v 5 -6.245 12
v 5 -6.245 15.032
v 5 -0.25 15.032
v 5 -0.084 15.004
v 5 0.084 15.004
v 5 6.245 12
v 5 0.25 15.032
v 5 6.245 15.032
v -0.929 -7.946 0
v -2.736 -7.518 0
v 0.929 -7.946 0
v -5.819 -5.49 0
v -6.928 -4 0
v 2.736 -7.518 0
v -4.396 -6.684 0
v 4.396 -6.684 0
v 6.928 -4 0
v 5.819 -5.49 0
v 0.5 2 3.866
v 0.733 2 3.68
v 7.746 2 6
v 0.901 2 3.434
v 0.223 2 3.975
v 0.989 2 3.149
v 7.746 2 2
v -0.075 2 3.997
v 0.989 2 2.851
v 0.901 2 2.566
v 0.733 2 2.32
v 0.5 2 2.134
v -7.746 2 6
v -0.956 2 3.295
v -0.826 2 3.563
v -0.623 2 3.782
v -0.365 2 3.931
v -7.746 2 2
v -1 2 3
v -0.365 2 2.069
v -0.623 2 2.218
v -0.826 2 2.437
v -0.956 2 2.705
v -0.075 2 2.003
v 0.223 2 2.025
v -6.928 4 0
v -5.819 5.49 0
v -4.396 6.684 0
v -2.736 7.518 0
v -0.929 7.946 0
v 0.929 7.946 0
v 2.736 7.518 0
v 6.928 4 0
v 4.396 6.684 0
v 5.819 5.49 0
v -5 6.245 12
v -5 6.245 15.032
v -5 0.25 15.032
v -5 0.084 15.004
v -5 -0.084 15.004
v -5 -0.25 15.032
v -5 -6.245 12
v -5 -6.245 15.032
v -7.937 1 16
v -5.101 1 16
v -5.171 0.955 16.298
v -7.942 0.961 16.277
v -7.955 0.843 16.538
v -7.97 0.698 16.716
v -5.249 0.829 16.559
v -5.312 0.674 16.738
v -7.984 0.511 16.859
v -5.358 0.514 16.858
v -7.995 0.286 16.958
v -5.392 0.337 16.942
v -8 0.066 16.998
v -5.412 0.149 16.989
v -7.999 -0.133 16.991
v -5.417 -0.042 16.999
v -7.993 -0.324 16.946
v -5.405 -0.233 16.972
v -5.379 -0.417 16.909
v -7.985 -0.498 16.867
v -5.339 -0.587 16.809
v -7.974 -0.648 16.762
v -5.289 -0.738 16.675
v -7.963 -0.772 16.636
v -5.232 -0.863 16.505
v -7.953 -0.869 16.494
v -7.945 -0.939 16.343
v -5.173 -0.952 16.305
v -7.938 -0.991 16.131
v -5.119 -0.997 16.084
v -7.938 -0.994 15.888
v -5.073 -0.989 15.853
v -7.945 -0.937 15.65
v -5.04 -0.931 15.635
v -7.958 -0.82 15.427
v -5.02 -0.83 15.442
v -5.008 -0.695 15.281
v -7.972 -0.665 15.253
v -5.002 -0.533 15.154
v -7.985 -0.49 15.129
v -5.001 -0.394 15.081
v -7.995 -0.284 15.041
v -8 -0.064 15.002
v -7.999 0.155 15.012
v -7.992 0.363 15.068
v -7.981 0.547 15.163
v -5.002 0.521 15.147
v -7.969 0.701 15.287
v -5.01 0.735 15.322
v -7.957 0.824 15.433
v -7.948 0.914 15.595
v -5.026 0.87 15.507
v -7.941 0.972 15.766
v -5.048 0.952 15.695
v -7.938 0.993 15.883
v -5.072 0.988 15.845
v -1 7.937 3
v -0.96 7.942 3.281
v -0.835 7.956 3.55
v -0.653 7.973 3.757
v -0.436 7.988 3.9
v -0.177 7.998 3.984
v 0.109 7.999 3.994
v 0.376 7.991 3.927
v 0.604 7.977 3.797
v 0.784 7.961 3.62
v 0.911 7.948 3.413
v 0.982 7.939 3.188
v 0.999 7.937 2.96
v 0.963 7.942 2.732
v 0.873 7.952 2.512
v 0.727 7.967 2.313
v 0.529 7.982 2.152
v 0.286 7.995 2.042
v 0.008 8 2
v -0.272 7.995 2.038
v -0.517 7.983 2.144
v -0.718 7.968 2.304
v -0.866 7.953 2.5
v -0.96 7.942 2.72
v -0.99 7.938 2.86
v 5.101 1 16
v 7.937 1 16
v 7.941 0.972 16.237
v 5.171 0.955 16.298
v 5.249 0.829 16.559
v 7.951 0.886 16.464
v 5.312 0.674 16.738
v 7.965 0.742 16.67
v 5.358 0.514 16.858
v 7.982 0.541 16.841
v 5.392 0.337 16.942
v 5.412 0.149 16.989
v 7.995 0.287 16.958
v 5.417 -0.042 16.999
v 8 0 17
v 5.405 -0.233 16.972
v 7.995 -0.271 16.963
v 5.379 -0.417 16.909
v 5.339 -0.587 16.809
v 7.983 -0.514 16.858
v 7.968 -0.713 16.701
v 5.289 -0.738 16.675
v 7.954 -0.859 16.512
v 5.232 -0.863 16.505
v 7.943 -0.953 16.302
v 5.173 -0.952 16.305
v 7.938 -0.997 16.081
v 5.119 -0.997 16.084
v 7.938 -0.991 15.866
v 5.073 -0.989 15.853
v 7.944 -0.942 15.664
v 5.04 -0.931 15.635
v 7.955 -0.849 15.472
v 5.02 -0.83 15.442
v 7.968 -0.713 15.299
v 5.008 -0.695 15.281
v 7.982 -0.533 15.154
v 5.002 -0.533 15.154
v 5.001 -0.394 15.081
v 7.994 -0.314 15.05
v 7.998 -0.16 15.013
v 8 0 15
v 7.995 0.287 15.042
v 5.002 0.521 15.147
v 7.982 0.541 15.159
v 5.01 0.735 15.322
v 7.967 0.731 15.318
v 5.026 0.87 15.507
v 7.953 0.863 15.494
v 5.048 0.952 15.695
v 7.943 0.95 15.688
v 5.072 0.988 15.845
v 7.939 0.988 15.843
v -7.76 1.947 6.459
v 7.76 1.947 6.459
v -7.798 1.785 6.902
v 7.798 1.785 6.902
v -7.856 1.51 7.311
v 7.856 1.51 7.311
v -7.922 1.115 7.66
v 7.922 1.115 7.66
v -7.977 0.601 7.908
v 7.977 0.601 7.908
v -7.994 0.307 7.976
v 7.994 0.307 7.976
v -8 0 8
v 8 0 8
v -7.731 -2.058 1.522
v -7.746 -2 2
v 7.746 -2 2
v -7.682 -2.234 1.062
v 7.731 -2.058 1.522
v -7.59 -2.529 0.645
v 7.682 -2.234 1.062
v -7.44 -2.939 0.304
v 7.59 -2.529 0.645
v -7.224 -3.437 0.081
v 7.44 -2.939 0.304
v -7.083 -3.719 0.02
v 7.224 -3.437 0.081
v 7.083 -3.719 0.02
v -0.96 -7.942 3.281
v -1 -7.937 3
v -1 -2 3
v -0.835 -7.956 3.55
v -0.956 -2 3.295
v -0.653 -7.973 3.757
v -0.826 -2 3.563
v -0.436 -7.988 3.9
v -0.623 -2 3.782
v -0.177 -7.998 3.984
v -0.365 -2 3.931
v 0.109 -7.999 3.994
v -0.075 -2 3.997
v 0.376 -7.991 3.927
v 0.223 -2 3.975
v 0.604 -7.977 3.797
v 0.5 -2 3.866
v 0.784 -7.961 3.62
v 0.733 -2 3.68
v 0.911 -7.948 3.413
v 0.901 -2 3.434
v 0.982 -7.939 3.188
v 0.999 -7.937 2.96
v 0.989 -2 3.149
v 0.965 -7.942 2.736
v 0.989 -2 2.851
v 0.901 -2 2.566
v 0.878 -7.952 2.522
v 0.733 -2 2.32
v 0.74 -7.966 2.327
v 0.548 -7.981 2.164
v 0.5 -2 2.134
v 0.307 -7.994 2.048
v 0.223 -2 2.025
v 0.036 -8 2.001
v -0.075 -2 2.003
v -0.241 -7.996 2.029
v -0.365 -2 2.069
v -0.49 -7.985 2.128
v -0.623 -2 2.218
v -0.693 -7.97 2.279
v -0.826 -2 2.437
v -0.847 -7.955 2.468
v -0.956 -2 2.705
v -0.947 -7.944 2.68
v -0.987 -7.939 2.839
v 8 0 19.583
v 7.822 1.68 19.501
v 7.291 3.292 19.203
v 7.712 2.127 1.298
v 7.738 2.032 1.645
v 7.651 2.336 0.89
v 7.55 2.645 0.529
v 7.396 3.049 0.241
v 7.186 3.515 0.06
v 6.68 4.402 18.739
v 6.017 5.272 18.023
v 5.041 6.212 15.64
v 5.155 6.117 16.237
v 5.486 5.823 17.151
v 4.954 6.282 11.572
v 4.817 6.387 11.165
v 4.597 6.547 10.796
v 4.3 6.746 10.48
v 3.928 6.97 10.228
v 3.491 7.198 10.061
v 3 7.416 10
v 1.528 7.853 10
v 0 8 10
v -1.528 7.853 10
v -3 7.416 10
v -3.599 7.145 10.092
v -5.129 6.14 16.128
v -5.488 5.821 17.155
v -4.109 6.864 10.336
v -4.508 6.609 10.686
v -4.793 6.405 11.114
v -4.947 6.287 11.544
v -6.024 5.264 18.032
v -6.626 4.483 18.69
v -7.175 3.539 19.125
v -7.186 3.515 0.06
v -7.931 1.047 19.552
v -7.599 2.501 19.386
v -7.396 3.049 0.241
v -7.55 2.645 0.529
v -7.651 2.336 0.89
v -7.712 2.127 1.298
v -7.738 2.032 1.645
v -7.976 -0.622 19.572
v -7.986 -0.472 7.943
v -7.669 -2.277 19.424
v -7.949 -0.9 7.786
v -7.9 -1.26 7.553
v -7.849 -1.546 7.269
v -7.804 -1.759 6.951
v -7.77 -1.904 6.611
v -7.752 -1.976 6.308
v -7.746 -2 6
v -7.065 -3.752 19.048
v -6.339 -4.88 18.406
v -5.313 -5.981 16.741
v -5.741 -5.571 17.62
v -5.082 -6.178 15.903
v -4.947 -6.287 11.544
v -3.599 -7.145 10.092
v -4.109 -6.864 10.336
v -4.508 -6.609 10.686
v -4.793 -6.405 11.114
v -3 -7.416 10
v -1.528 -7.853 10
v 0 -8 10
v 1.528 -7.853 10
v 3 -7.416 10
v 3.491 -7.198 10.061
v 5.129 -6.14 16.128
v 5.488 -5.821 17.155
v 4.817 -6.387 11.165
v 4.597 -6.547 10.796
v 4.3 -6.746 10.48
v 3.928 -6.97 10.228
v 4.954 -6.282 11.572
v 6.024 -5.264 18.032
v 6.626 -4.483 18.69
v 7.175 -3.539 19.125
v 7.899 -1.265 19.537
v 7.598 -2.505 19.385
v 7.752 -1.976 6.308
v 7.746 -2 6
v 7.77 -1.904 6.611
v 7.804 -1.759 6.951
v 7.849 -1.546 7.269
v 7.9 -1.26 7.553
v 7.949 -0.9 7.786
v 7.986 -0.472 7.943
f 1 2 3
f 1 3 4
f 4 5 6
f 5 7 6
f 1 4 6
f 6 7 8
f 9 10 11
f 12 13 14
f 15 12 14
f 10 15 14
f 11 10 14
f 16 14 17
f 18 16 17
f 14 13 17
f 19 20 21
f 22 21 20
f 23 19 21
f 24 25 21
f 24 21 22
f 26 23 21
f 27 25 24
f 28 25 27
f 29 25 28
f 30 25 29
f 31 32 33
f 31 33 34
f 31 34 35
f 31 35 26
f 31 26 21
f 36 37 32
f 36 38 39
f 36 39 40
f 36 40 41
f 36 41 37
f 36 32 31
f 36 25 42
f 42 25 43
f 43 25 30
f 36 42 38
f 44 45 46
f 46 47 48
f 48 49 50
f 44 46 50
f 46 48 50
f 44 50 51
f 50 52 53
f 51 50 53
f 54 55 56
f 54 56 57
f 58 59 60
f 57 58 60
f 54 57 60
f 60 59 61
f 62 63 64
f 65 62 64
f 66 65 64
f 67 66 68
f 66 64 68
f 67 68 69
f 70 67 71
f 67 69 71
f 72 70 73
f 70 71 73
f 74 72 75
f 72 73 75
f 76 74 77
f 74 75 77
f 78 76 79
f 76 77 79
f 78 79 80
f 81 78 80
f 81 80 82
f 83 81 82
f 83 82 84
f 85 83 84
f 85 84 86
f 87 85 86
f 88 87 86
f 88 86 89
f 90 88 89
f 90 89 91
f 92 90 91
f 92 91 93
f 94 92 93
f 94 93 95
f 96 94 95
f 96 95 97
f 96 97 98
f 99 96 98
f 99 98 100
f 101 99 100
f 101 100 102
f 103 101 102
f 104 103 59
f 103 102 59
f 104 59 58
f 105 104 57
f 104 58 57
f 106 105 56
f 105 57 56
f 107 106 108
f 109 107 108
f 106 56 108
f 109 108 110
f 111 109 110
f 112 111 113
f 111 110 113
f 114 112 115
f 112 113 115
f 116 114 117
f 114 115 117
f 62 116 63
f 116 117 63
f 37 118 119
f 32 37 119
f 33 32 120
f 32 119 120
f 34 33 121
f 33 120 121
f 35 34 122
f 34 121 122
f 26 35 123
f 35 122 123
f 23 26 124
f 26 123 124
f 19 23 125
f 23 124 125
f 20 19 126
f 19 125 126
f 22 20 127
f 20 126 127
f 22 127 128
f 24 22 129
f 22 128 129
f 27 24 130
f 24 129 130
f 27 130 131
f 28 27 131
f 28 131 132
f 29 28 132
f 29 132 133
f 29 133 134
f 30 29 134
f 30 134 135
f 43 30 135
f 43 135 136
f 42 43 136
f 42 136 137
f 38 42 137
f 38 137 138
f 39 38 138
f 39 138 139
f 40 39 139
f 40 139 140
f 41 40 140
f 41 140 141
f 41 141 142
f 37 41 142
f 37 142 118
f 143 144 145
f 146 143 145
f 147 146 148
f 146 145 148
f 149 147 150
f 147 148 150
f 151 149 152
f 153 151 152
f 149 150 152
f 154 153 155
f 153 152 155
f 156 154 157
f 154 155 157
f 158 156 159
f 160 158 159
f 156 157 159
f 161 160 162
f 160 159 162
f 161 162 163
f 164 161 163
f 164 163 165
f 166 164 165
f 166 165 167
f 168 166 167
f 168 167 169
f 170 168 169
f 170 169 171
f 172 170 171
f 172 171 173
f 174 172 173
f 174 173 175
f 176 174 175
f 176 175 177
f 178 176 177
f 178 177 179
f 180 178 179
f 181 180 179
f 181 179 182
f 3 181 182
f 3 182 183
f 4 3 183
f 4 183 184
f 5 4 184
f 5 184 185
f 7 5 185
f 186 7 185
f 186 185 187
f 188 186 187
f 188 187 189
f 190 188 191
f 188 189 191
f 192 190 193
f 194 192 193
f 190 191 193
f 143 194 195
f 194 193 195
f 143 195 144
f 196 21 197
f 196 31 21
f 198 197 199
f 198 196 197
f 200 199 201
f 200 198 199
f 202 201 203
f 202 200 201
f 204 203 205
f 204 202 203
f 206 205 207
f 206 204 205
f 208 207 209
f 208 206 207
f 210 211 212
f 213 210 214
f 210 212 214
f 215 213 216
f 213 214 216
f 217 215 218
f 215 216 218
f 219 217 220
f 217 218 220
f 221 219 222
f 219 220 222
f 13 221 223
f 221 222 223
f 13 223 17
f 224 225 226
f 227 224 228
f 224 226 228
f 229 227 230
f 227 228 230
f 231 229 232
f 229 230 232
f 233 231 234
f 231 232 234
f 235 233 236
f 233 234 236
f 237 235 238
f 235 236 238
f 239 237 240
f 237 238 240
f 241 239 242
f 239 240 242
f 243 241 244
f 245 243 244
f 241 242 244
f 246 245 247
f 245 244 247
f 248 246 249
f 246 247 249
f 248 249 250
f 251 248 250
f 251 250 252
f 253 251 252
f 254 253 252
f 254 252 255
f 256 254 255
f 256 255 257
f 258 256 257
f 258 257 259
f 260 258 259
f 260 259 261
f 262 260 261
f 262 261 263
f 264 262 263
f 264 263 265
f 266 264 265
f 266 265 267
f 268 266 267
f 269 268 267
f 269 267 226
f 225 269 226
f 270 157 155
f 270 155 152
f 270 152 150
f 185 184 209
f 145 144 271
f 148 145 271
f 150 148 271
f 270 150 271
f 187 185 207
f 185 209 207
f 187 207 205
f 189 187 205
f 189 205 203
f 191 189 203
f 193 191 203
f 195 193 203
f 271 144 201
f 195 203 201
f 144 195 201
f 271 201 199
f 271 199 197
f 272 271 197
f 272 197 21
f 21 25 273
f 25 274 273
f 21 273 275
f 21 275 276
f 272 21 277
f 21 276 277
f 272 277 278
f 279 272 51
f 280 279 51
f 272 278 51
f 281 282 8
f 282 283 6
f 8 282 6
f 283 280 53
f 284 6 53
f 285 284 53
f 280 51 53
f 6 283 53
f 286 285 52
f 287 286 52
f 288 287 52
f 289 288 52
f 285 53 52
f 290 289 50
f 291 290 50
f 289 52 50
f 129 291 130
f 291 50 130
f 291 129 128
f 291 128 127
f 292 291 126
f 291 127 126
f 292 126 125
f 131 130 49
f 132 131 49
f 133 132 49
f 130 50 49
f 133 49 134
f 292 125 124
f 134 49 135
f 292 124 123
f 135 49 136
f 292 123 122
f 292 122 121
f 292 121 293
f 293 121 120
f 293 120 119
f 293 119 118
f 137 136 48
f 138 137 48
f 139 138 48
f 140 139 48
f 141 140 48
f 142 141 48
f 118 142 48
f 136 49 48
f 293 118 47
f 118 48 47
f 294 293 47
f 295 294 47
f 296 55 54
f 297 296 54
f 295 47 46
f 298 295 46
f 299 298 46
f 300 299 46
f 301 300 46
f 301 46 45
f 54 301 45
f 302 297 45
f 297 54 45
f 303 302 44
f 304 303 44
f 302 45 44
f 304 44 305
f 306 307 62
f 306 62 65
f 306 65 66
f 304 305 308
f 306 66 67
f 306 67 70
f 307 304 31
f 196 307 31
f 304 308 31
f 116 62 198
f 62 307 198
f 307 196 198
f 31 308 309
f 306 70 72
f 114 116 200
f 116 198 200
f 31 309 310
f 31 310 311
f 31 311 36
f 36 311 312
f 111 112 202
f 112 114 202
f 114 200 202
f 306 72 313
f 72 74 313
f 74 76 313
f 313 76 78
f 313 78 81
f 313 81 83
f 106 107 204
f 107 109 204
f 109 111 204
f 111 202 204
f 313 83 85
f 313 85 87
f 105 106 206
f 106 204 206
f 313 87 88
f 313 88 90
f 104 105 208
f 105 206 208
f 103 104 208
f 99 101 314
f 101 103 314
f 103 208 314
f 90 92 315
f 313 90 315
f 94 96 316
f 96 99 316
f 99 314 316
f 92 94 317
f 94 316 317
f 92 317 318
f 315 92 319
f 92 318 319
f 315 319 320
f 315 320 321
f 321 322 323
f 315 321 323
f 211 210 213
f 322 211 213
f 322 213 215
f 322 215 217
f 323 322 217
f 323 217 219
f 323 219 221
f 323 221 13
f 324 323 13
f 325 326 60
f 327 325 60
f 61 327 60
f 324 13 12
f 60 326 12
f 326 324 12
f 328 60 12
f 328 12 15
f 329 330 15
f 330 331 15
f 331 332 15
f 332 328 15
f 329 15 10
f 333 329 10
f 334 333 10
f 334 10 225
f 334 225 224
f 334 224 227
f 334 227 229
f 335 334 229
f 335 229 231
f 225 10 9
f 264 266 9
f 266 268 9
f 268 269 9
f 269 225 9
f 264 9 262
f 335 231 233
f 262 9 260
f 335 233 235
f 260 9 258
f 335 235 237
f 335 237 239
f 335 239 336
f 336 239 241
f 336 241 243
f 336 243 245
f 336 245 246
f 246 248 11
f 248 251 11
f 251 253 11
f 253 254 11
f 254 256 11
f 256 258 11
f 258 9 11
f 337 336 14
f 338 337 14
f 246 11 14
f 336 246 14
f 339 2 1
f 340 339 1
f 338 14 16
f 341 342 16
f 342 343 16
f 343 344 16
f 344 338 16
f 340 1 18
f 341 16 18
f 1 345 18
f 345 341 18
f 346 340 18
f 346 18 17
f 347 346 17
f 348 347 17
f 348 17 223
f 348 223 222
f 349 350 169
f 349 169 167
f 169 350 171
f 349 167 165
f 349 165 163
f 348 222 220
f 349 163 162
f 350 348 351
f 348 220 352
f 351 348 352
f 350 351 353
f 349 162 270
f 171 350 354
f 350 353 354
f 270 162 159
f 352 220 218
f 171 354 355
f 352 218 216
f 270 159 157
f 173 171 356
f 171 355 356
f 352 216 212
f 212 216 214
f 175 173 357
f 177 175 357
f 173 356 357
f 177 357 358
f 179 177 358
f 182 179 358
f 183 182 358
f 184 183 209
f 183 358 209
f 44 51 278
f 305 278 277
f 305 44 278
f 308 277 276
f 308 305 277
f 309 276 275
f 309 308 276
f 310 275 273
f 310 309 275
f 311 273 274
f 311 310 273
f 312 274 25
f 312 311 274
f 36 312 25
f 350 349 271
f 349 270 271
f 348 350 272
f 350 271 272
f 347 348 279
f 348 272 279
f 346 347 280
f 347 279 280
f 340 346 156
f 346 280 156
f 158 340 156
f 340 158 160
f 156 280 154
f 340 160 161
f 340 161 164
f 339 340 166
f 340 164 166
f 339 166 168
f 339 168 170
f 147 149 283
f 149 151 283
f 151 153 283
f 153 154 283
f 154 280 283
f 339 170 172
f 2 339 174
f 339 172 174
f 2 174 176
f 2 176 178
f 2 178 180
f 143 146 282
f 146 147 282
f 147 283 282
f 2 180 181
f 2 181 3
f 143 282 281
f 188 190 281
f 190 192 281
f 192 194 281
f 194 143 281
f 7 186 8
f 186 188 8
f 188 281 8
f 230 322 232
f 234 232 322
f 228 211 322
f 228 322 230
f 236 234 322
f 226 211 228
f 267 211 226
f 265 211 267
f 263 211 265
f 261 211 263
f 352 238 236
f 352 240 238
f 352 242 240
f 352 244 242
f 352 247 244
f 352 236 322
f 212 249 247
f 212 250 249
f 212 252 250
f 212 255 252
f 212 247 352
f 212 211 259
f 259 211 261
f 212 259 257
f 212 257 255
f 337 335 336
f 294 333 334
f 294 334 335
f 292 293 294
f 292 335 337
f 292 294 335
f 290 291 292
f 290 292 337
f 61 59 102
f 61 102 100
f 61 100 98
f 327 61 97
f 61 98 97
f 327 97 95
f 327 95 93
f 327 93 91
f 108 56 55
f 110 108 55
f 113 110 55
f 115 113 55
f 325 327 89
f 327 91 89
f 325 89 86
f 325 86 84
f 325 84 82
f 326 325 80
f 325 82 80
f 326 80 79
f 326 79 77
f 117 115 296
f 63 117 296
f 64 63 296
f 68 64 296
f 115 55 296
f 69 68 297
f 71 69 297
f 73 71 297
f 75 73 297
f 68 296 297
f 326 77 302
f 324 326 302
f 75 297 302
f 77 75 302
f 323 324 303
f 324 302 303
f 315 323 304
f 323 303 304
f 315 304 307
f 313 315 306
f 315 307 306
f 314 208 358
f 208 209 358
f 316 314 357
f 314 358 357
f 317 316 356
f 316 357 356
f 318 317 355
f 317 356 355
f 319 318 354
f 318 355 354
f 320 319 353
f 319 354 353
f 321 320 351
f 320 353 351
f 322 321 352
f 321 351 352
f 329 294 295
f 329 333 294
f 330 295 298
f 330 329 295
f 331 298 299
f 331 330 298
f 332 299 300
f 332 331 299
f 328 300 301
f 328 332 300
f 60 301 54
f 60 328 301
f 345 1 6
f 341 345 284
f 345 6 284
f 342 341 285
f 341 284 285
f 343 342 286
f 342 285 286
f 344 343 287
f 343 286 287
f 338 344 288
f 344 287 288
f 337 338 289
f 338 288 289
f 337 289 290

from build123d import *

# Parameters (mm, degrees)
F0_R         = 8
F1_DEPTH     = 20
F3_DEPTH     = 10
F5_DEPTH     = 8
F7_D         = 2
F7_DEPTH     = 3.001
F9_D         = 2
F10_T1_DEPTH = 37.4894960018
F12_D        = 2
F12_DEPTH    = 6.0010001
F14_D        = 2
F15_R        = 2
F16_R        = 1.9999


# Not quite as in the source:
# - a fillet or chamfer that OpenCascade refuses, or shapes differently, is made with other operations: its cross-section is extruded or revolved along the edge and cut away or added
# - a fillet or chamfer is up to 0.001 mm smaller than in the source, because OpenCascade refuses the exact size


with BuildPart() as f1:
    # F0 (on Top) → F1 (new body)
    with BuildSketch(Plane.XY):
        Circle(F0_R)
    extrude(amount=F1_DEPTH)

    # F2 (on face) → F3 (cut)
    with BuildSketch(Plane.XY.offset(20)):
        with BuildLine():
            ThreePointArc((5, 6.2449979984), (0, 8), (-5, 6.2449979984))
            Line((-5, 6.2449979984), (-5, -6.2449979984))
            ThreePointArc((-5, -6.2449979984), (0, -8), (5, -6.2449979984))
            Line((5, -6.2449979984), (5, 6.2449979984))
        make_face()
    extrude(amount=-F3_DEPTH, mode=Mode.SUBTRACT)

    # F4 (on face) → F5 (cut)
    with BuildSketch(Plane.XY):
        with BuildLine():
            ThreePointArc((8, 0), (7.9362375701, 1.0080343399), (7.7459666924, 2))
            Line((7.7459666924, 2), (-7.7459666924, 2))
            ThreePointArc((-7.7459666924, 2), (-7.9362375701, 1.0080343399), (-8, 0))
            ThreePointArc((-8, 0), (-7.9362375701, -1.0080343399), (-7.7459666924, -2))
            Line((-7.7459666924, -2), (7.7459666924, -2))
            ThreePointArc((7.7459666924, -2), (7.9362375701, -1.0080343399), (8, 0))
        make_face()
    extrude(amount=F5_DEPTH, mode=Mode.SUBTRACT)

    # F7 (through all, one way)
    with BuildSketch(Plane.YZ.offset(-5)):
        with Locations((0, 16)):
            Circle(F7_D / 2)
    extrude(amount=-F7_DEPTH, mode=Mode.SUBTRACT)

    # F9 (through all)
    with Locations(Plane(origin=(5, 0, 0), x_dir=(0, -1, 0), z_dir=(-1, 0, 0))):
        with Locations((0, 16)):
            Hole(F9_D / 2)

    # F10: fillet of radius 5 on 2 edges, made by hand

    # F10_s2 → F10_t1 (cut)
    with BuildSketch(Plane.XZ.offset(-18.7447480009)):
        with BuildLine():
            ThreePointArc((9.9999, 20.0001), (6.4643660941, 18.5356339059), (4.9999, 15.0001))
            Line((4.9999, 15.0001), (4.8999, 15.0001))
            ThreePointArc((4.8999, 15.0001), (4.9, 17.50005), (4.9, 20))
            Line((4.9, 20), (5, 20.1))
            ThreePointArc((5, 20.1), (7.49995, 20.1), (9.9999, 20.1001))
            Line((9.9999, 20.1001), (9.9999, 20.0001))
        make_face()
        with BuildLine():
            ThreePointArc((-4.9999, 15.0001), (-6.4643660941, 18.5356339059), (-9.9999, 20.0001))
            Line((-9.9999, 20.0001), (-9.9999, 20.1001))
            ThreePointArc((-9.9999, 20.1001), (-7.49995, 20.1), (-5, 20.1))
            Line((-5, 20.1), (-4.9, 20))
            ThreePointArc((-4.9, 20), (-4.9, 17.50005), (-4.8999, 15.0001))
            Line((-4.8999, 15.0001), (-4.9999, 15.0001))
        make_face()
    extrude(amount=F10_T1_DEPTH, mode=Mode.SUBTRACT)

    # F12 (through all, one way)
    with BuildSketch(Plane(origin=(0, -2, 0), x_dir=(-1, 0, 0), z_dir=(0, 1, 0))):
        with Locations((0, 3)):
            Circle(F12_D / 2)
    extrude(amount=-F12_DEPTH, mode=Mode.SUBTRACT)

    # F14 (through all)
    with Locations(Plane.XZ.offset(-2)):
        with Locations((0, 3)):
            Hole(F14_D / 2)

    # F15
    f15_edges = [f1.edges().sort_by_distance(p)[0] for p in [
        (0, 2, 0),
        (0, -2, 0),
    ]]
    fillet(f15_edges, radius=F15_R)

    # F16 (radius 2 in the source; OpenCascade refuses exactly that, so slightly less here)
    f16_edges = [f1.edges().sort_by_distance(p)[0] for p in [
        (-5, 0, 10),
        (5, 0, 10),
        (0, 2, 8),
        (0, -2, 8),
    ]]
    fillet(f16_edges, radius=F16_R)


solid = f1.part
